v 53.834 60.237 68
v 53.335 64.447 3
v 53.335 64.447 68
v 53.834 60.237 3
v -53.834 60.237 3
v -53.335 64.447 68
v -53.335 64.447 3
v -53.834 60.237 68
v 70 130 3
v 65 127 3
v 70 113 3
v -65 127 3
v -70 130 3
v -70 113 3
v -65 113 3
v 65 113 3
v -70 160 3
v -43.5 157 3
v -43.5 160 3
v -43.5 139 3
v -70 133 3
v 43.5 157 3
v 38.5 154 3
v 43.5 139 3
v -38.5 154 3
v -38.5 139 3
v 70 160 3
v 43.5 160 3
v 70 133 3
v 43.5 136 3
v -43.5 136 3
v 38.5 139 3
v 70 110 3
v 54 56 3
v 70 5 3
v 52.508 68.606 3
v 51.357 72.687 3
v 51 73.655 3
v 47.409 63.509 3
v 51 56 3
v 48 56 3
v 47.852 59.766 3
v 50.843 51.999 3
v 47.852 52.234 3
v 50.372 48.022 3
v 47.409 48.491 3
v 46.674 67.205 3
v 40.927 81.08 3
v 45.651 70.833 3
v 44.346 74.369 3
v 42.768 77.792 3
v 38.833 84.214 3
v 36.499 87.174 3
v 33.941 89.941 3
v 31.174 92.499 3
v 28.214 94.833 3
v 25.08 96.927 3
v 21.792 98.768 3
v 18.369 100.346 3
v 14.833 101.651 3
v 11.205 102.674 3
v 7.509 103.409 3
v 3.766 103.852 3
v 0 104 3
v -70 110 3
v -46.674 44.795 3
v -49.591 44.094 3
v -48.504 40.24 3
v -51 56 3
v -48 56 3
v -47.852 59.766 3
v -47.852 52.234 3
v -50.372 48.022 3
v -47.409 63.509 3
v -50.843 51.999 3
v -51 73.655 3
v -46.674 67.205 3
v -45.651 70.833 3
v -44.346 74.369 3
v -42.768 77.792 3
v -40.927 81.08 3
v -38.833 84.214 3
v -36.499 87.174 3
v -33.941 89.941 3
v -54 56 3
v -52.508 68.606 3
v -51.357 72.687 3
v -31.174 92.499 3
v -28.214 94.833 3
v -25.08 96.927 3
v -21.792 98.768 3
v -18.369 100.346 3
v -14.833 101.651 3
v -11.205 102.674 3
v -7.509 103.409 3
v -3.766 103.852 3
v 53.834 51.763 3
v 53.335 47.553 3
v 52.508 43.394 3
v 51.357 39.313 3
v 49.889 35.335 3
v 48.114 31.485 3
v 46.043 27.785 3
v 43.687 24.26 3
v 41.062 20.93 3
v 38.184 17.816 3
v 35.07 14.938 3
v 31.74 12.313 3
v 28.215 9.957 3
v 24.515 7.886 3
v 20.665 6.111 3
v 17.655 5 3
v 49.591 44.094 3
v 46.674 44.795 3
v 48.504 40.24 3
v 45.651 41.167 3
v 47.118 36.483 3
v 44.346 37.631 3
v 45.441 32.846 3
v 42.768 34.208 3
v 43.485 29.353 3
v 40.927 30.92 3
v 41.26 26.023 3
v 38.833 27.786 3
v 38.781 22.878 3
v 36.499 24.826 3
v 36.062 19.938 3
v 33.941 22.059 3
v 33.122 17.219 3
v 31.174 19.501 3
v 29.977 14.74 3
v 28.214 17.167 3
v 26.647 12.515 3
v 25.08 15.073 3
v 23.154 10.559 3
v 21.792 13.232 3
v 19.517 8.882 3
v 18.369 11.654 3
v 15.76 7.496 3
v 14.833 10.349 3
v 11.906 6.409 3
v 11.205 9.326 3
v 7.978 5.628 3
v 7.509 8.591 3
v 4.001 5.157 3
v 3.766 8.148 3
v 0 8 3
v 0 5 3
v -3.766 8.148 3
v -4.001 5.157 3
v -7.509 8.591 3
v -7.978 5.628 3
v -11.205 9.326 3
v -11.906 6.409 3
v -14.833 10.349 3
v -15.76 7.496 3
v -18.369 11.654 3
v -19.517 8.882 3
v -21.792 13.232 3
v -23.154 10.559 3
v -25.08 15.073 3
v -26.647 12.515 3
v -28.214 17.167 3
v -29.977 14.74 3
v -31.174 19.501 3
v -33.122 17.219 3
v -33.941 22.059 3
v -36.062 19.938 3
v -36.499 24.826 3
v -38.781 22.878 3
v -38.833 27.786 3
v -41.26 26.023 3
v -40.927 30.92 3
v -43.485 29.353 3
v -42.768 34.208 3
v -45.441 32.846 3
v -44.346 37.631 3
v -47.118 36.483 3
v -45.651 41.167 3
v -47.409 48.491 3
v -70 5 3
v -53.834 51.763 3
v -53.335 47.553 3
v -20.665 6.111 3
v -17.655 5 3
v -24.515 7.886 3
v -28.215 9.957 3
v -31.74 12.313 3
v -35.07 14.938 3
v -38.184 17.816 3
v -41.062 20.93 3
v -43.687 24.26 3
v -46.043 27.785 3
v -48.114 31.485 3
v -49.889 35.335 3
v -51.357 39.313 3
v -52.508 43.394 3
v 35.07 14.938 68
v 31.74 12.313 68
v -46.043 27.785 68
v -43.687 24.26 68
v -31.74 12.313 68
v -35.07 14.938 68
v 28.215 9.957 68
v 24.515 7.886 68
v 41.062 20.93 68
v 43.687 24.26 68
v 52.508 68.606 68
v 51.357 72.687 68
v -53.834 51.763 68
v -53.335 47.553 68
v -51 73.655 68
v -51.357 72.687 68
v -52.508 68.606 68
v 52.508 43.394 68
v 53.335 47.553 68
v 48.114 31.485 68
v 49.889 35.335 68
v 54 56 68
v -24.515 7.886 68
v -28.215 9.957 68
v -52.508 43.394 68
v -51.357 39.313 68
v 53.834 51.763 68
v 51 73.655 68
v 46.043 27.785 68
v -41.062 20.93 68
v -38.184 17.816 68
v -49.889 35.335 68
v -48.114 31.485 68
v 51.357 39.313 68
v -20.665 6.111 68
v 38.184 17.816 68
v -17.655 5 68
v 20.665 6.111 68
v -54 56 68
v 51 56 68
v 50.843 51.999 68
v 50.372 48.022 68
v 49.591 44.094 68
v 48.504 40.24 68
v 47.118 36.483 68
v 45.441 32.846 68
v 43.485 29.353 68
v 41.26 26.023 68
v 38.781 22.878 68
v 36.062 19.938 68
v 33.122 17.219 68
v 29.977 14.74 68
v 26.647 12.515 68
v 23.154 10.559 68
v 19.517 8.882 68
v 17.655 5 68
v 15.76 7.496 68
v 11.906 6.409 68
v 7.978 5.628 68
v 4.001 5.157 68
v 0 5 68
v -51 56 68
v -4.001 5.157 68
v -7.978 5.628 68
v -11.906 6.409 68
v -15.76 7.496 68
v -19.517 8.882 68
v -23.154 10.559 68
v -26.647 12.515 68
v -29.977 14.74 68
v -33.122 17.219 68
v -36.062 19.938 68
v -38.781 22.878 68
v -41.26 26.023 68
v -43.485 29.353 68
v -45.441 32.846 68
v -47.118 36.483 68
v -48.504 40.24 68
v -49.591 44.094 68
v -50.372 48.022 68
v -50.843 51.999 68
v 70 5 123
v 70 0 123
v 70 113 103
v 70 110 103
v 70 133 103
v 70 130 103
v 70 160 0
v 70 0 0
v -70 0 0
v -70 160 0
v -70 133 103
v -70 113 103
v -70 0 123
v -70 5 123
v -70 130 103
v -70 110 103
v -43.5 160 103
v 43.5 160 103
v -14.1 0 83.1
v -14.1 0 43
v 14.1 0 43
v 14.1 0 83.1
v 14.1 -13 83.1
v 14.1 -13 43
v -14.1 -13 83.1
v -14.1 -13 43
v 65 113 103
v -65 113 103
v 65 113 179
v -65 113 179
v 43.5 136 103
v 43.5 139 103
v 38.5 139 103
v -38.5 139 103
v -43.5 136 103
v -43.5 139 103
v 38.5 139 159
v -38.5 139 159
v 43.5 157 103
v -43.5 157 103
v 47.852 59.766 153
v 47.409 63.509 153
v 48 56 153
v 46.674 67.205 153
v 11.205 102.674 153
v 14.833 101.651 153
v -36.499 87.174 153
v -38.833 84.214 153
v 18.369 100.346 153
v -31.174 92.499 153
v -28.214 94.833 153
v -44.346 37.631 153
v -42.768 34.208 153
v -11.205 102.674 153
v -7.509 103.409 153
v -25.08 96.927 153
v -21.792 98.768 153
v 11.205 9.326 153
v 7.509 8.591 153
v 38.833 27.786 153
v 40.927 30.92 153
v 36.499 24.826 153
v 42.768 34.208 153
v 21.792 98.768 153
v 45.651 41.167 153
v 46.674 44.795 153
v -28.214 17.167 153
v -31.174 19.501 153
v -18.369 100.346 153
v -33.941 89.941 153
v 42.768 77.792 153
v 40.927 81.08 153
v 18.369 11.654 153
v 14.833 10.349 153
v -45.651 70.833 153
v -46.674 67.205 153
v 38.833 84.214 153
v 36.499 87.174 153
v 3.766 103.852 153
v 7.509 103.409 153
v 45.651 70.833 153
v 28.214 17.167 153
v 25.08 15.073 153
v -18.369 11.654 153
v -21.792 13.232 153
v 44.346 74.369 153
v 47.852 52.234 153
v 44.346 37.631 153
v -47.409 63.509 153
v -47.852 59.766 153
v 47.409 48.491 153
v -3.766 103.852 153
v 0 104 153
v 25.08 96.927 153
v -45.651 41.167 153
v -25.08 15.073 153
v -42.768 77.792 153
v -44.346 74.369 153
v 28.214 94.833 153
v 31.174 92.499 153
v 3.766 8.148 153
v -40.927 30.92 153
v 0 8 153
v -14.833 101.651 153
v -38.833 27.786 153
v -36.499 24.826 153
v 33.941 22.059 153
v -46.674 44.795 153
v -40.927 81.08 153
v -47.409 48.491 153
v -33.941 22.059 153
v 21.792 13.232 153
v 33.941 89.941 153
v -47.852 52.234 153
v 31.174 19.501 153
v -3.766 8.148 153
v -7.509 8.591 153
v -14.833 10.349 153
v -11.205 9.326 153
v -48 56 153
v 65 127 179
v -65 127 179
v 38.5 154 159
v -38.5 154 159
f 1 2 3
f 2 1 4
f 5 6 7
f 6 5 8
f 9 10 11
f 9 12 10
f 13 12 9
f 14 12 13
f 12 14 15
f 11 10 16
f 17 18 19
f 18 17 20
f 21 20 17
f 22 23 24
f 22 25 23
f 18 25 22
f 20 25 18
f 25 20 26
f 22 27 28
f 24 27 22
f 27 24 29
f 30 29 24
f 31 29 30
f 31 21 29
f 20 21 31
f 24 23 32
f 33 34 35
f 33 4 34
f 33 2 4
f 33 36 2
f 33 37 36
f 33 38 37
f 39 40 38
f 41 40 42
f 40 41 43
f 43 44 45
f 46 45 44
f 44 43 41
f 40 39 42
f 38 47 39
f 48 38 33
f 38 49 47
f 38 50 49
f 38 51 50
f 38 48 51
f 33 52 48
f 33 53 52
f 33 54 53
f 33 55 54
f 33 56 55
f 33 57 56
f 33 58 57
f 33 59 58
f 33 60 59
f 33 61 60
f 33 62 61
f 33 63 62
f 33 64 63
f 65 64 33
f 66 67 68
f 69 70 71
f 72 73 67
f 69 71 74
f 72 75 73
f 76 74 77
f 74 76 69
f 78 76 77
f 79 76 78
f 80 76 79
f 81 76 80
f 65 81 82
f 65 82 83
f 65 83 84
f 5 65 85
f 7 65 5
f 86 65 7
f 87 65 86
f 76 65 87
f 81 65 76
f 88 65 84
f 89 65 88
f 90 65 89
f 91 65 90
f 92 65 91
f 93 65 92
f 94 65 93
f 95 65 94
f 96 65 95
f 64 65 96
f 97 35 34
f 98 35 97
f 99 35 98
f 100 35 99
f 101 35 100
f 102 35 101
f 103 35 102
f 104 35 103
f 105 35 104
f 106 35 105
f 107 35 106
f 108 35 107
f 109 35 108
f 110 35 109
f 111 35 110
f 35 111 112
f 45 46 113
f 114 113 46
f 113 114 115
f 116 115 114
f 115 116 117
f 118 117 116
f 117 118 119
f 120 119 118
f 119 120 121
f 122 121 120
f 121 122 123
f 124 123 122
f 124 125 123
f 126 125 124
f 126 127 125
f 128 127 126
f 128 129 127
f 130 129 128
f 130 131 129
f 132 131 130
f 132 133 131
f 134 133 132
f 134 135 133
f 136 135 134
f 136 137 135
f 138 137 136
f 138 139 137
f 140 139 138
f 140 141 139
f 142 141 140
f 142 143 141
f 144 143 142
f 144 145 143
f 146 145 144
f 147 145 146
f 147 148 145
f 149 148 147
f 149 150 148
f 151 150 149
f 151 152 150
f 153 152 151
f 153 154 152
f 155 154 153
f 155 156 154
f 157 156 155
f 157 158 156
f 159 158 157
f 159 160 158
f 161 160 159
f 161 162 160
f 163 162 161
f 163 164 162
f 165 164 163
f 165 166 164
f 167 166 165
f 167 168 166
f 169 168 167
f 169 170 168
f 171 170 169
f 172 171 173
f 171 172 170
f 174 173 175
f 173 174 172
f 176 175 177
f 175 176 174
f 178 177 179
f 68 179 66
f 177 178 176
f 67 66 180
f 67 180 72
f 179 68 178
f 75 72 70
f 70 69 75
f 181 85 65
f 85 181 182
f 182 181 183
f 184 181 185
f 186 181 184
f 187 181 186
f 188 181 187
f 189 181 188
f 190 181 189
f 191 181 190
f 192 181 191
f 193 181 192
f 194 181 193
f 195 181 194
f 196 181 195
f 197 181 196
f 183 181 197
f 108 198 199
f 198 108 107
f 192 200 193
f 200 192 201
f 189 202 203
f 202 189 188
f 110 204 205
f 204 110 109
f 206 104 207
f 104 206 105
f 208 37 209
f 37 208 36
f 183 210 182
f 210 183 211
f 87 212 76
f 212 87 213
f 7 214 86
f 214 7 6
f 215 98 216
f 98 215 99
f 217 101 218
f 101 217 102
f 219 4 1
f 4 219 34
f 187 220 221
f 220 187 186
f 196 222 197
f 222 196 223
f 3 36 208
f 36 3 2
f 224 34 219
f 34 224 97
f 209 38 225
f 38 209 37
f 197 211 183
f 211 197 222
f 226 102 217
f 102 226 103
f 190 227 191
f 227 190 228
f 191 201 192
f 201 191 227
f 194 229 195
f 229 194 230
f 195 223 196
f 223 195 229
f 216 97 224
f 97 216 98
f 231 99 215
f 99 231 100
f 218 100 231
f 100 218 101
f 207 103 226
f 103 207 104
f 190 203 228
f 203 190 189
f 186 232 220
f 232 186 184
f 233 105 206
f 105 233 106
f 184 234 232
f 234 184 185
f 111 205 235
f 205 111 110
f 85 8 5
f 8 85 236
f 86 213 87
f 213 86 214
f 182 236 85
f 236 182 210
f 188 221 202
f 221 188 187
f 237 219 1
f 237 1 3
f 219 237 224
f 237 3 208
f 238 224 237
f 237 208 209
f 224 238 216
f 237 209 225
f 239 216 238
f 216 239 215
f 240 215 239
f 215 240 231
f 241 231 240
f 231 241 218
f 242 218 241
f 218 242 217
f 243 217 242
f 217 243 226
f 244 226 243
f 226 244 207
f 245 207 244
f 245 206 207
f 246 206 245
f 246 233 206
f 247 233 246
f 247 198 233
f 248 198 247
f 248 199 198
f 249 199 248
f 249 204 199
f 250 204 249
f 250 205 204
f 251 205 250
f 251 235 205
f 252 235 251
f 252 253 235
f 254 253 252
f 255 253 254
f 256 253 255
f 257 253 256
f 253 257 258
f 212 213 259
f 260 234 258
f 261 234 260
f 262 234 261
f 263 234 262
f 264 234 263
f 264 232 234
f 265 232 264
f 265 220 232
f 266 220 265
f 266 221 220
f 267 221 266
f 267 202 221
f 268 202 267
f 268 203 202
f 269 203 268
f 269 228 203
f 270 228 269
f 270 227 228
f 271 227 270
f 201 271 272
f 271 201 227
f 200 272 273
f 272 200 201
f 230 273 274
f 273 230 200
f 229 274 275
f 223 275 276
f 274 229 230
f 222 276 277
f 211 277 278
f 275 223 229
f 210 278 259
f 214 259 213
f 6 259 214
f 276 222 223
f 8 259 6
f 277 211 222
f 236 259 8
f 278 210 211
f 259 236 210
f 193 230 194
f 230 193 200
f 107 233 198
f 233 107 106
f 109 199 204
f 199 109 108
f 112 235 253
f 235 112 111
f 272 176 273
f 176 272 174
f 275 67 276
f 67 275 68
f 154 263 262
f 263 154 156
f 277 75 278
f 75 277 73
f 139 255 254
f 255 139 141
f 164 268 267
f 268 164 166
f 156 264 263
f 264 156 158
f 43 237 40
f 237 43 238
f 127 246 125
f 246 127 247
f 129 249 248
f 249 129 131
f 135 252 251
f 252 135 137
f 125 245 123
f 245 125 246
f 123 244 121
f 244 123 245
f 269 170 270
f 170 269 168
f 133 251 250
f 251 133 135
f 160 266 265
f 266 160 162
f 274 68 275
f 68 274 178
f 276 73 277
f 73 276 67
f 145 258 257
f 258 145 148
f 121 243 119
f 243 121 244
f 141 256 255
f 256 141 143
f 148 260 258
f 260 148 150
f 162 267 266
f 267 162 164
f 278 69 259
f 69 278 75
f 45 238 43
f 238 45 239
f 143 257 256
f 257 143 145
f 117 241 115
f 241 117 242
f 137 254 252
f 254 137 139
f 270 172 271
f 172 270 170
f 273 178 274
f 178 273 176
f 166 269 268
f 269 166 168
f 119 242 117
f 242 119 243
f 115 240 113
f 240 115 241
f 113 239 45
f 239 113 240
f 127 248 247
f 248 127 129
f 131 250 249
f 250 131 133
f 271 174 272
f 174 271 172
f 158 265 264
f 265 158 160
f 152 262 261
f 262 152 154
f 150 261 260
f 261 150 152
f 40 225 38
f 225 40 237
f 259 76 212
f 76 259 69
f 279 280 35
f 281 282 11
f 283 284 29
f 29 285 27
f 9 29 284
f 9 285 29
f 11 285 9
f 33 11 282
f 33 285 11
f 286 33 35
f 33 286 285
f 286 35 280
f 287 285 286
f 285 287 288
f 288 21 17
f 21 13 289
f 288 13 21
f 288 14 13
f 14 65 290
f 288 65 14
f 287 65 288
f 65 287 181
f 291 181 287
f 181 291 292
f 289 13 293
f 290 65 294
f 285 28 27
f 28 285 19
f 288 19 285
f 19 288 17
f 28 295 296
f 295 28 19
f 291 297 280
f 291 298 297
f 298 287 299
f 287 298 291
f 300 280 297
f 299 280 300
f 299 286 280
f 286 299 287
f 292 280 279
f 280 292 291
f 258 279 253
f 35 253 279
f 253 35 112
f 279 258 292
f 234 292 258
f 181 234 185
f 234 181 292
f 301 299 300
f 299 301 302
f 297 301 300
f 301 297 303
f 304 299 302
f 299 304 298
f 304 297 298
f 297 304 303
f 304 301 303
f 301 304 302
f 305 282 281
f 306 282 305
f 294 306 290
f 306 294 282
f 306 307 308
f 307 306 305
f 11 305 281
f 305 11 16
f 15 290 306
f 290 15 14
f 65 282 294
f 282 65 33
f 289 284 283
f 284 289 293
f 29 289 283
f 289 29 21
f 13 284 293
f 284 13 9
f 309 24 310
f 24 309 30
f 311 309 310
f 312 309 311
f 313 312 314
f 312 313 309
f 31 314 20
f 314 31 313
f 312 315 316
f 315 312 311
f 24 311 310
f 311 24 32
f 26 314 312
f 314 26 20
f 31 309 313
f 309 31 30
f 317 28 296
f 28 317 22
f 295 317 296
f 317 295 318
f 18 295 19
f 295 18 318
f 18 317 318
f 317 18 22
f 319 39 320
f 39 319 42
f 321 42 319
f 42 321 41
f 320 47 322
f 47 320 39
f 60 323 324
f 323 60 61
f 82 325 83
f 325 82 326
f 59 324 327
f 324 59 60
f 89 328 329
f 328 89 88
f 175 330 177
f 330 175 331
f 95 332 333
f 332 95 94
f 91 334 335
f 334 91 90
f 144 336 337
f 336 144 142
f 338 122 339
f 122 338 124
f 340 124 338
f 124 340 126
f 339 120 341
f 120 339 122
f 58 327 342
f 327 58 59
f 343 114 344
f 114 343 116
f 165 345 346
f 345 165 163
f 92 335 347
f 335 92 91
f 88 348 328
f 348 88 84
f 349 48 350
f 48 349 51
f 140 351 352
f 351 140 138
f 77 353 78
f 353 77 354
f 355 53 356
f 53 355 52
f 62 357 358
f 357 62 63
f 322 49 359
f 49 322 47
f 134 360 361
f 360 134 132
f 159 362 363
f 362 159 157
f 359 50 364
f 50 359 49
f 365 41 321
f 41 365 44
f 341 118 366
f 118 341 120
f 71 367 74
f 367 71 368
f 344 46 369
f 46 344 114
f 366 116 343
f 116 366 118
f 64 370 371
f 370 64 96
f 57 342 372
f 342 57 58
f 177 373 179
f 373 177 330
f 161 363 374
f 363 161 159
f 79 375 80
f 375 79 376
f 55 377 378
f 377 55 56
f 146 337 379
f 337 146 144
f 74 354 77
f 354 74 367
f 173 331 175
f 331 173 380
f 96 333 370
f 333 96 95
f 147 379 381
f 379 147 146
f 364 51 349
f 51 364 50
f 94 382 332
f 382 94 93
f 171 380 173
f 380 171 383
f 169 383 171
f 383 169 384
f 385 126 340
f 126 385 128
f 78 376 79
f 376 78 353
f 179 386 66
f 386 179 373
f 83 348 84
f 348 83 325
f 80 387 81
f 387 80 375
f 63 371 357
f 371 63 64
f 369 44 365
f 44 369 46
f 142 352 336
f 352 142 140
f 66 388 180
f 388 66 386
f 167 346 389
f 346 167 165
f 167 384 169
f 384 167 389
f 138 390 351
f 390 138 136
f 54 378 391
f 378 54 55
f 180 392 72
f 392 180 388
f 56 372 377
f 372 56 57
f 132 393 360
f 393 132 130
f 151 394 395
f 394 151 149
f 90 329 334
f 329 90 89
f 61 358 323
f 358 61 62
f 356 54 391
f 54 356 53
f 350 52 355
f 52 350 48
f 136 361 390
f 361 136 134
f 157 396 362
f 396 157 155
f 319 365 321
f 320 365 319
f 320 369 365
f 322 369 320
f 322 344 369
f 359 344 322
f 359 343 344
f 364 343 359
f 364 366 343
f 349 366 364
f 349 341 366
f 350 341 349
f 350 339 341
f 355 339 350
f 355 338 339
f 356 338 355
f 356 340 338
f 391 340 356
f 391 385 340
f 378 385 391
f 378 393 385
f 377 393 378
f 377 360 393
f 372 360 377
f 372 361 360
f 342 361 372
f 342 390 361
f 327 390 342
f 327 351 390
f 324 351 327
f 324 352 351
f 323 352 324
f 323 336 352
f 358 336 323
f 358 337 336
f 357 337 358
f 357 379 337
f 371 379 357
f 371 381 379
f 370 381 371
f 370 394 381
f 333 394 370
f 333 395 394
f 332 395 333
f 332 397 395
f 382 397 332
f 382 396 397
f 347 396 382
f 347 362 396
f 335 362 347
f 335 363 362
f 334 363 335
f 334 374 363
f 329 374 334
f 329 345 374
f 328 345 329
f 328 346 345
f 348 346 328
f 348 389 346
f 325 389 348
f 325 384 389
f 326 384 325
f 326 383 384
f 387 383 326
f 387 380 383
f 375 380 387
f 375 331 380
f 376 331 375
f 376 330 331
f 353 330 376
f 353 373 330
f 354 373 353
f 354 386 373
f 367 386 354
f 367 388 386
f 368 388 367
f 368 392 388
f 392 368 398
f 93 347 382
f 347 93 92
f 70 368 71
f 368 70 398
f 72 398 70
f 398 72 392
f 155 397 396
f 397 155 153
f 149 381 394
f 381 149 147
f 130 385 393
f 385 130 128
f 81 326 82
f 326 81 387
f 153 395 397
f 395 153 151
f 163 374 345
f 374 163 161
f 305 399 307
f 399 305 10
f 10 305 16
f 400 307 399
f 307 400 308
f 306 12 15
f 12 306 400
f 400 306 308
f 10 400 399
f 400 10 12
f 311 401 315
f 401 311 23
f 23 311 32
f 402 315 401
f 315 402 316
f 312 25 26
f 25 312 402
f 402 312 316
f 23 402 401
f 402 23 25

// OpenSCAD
// Shibumi Beach Caddy — MASSING STUDY (not final geometry)
// Purpose: prove all three items pack into one printable body and visualize the
// recommended layout. Depth-stack, bottle nearest the mount. Translucent "ghosts"
// show the phone/Kindle/Yeti envelopes inside their receptacles.
//
// Coords: X = width, Y = depth (0 = chair/back, +Y = toward user/front), Z = up.

$fn = 80;

// ---- Per-person device dims (Matt reference, WM#584) ----
phone_w = 77;  phone_h = 156; phone_t = 15;   // iPhone in case (h,t are floors/bump)
kindle_w = 130; kindle_h = 176; kindle_t = 14;
bottle_d = 96;                                  // Yeti — ASSUMED diameter (flag)

// ---- Margins ----
w_clear = 4;    t_clear = 3;    bottle_clear = 6;

// interior envelopes
ph_W = phone_w + w_clear;   ph_T = phone_t + t_clear;      // 81 x 18
kn_W = kindle_w + w_clear;  kn_T = kindle_t + t_clear;     // 134 x 17
bo_D = bottle_d + bottle_clear;                            // 102 cradle ID

// ---- Structure params ----
wall = 3;
base_t = 3;
back_wall_t = 5;
spine_h = 120;      // back spine wall
slot_h = 100;       // phone/kindle slot wall height
cup_h  = 65;        // bottle cradle ring height
gap = 3;

caddy_w = kn_W + 2*wall;   // 140, Kindle governs width

// ---- Cumulative depth layout (from back/chair) ----
y_back1   = back_wall_t;                         // 5
y_bo0     = y_back1;
y_bo1     = y_bo0 + bo_D;                         // 107  (bottle cradle row)
y_kslot0  = y_bo1 + gap;                          // 110
y_kslot1  = y_kslot0 + kn_T + 2*wall;            // 133  (kindle slot row, incl walls)
y_pslot0  = y_kslot1 + gap;                       // 136
y_pslot1  = y_pslot0 + ph_T + 2*wall;            // 160  (phone slot row, incl walls)
caddy_depth = y_pslot1;                           // 160

bo_cx = 0;
bo_cy = (y_bo0 + y_bo1)/2;                        // bottle center depth

module box(w,d,h) translate([-w/2,0,0]) cube([w,d,h]);

// ---------- CADDY (opaque) ----------
color([0.80,0.75,0.62]) {
  // base tray
  translate([0,0,0]) box(caddy_w, caddy_depth, base_t);

  // back spine wall (structural; tablets lean on it; socket integrates on its back)
  translate([0,0,base_t]) box(caddy_w, back_wall_t, spine_h);

  // integrated capture-socket pad on the back face (faces chair, -Y)
  color([0.55,0.55,0.58])
    translate([0,-13,base_t+spine_h/2-20]) box(28.2, 13, 40.1);

  // bottle cradle: C-ring open toward the front (+Y), low cup
  translate([bo_cx,bo_cy,base_t])
    difference() {
      cylinder(h=cup_h, d=bo_D+2*wall);
      translate([0,0,-0.1]) cylinder(h=cup_h+0.2, d=bo_D);         // bore
      translate([-bo_D/2, 0, -0.1]) cube([bo_D, bo_D, cup_h+0.2]); // open front half
    }

  // kindle slot: two cross-width walls
  translate([0,y_kslot0,base_t])          box(kn_W+2*wall, wall, slot_h);
  translate([0,y_kslot1-wall,base_t])     box(kn_W+2*wall, wall, slot_h);

  // phone slot: two cross-width walls
  translate([0,y_pslot0,base_t])          box(ph_W+2*wall, wall, slot_h);
  translate([0,y_pslot1-wall,base_t])     box(ph_W+2*wall, wall, slot_h);
}

// ---------- ITEM GHOSTS (translucent) ----------
// bottle
color([0.30,0.55,0.95,0.35])
  translate([bo_cx,bo_cy,base_t]) cylinder(h=150, d=bottle_d);
// kindle
color([0.30,0.85,0.55,0.35])
  translate([0, y_kslot0+wall, base_t]) box(kindle_w, kindle_t, kindle_h);
// phone
color([0.95,0.55,0.30,0.35])
  translate([0, y_pslot0+wall, base_t]) box(phone_w, phone_t, phone_h);

echo(str("MASSING footprint  W=", caddy_w, "  D=", caddy_depth, "  (bed 256x256)"));
echo(str("tallest ghost = kindle ", kindle_h, "  spine_h=", spine_h));
